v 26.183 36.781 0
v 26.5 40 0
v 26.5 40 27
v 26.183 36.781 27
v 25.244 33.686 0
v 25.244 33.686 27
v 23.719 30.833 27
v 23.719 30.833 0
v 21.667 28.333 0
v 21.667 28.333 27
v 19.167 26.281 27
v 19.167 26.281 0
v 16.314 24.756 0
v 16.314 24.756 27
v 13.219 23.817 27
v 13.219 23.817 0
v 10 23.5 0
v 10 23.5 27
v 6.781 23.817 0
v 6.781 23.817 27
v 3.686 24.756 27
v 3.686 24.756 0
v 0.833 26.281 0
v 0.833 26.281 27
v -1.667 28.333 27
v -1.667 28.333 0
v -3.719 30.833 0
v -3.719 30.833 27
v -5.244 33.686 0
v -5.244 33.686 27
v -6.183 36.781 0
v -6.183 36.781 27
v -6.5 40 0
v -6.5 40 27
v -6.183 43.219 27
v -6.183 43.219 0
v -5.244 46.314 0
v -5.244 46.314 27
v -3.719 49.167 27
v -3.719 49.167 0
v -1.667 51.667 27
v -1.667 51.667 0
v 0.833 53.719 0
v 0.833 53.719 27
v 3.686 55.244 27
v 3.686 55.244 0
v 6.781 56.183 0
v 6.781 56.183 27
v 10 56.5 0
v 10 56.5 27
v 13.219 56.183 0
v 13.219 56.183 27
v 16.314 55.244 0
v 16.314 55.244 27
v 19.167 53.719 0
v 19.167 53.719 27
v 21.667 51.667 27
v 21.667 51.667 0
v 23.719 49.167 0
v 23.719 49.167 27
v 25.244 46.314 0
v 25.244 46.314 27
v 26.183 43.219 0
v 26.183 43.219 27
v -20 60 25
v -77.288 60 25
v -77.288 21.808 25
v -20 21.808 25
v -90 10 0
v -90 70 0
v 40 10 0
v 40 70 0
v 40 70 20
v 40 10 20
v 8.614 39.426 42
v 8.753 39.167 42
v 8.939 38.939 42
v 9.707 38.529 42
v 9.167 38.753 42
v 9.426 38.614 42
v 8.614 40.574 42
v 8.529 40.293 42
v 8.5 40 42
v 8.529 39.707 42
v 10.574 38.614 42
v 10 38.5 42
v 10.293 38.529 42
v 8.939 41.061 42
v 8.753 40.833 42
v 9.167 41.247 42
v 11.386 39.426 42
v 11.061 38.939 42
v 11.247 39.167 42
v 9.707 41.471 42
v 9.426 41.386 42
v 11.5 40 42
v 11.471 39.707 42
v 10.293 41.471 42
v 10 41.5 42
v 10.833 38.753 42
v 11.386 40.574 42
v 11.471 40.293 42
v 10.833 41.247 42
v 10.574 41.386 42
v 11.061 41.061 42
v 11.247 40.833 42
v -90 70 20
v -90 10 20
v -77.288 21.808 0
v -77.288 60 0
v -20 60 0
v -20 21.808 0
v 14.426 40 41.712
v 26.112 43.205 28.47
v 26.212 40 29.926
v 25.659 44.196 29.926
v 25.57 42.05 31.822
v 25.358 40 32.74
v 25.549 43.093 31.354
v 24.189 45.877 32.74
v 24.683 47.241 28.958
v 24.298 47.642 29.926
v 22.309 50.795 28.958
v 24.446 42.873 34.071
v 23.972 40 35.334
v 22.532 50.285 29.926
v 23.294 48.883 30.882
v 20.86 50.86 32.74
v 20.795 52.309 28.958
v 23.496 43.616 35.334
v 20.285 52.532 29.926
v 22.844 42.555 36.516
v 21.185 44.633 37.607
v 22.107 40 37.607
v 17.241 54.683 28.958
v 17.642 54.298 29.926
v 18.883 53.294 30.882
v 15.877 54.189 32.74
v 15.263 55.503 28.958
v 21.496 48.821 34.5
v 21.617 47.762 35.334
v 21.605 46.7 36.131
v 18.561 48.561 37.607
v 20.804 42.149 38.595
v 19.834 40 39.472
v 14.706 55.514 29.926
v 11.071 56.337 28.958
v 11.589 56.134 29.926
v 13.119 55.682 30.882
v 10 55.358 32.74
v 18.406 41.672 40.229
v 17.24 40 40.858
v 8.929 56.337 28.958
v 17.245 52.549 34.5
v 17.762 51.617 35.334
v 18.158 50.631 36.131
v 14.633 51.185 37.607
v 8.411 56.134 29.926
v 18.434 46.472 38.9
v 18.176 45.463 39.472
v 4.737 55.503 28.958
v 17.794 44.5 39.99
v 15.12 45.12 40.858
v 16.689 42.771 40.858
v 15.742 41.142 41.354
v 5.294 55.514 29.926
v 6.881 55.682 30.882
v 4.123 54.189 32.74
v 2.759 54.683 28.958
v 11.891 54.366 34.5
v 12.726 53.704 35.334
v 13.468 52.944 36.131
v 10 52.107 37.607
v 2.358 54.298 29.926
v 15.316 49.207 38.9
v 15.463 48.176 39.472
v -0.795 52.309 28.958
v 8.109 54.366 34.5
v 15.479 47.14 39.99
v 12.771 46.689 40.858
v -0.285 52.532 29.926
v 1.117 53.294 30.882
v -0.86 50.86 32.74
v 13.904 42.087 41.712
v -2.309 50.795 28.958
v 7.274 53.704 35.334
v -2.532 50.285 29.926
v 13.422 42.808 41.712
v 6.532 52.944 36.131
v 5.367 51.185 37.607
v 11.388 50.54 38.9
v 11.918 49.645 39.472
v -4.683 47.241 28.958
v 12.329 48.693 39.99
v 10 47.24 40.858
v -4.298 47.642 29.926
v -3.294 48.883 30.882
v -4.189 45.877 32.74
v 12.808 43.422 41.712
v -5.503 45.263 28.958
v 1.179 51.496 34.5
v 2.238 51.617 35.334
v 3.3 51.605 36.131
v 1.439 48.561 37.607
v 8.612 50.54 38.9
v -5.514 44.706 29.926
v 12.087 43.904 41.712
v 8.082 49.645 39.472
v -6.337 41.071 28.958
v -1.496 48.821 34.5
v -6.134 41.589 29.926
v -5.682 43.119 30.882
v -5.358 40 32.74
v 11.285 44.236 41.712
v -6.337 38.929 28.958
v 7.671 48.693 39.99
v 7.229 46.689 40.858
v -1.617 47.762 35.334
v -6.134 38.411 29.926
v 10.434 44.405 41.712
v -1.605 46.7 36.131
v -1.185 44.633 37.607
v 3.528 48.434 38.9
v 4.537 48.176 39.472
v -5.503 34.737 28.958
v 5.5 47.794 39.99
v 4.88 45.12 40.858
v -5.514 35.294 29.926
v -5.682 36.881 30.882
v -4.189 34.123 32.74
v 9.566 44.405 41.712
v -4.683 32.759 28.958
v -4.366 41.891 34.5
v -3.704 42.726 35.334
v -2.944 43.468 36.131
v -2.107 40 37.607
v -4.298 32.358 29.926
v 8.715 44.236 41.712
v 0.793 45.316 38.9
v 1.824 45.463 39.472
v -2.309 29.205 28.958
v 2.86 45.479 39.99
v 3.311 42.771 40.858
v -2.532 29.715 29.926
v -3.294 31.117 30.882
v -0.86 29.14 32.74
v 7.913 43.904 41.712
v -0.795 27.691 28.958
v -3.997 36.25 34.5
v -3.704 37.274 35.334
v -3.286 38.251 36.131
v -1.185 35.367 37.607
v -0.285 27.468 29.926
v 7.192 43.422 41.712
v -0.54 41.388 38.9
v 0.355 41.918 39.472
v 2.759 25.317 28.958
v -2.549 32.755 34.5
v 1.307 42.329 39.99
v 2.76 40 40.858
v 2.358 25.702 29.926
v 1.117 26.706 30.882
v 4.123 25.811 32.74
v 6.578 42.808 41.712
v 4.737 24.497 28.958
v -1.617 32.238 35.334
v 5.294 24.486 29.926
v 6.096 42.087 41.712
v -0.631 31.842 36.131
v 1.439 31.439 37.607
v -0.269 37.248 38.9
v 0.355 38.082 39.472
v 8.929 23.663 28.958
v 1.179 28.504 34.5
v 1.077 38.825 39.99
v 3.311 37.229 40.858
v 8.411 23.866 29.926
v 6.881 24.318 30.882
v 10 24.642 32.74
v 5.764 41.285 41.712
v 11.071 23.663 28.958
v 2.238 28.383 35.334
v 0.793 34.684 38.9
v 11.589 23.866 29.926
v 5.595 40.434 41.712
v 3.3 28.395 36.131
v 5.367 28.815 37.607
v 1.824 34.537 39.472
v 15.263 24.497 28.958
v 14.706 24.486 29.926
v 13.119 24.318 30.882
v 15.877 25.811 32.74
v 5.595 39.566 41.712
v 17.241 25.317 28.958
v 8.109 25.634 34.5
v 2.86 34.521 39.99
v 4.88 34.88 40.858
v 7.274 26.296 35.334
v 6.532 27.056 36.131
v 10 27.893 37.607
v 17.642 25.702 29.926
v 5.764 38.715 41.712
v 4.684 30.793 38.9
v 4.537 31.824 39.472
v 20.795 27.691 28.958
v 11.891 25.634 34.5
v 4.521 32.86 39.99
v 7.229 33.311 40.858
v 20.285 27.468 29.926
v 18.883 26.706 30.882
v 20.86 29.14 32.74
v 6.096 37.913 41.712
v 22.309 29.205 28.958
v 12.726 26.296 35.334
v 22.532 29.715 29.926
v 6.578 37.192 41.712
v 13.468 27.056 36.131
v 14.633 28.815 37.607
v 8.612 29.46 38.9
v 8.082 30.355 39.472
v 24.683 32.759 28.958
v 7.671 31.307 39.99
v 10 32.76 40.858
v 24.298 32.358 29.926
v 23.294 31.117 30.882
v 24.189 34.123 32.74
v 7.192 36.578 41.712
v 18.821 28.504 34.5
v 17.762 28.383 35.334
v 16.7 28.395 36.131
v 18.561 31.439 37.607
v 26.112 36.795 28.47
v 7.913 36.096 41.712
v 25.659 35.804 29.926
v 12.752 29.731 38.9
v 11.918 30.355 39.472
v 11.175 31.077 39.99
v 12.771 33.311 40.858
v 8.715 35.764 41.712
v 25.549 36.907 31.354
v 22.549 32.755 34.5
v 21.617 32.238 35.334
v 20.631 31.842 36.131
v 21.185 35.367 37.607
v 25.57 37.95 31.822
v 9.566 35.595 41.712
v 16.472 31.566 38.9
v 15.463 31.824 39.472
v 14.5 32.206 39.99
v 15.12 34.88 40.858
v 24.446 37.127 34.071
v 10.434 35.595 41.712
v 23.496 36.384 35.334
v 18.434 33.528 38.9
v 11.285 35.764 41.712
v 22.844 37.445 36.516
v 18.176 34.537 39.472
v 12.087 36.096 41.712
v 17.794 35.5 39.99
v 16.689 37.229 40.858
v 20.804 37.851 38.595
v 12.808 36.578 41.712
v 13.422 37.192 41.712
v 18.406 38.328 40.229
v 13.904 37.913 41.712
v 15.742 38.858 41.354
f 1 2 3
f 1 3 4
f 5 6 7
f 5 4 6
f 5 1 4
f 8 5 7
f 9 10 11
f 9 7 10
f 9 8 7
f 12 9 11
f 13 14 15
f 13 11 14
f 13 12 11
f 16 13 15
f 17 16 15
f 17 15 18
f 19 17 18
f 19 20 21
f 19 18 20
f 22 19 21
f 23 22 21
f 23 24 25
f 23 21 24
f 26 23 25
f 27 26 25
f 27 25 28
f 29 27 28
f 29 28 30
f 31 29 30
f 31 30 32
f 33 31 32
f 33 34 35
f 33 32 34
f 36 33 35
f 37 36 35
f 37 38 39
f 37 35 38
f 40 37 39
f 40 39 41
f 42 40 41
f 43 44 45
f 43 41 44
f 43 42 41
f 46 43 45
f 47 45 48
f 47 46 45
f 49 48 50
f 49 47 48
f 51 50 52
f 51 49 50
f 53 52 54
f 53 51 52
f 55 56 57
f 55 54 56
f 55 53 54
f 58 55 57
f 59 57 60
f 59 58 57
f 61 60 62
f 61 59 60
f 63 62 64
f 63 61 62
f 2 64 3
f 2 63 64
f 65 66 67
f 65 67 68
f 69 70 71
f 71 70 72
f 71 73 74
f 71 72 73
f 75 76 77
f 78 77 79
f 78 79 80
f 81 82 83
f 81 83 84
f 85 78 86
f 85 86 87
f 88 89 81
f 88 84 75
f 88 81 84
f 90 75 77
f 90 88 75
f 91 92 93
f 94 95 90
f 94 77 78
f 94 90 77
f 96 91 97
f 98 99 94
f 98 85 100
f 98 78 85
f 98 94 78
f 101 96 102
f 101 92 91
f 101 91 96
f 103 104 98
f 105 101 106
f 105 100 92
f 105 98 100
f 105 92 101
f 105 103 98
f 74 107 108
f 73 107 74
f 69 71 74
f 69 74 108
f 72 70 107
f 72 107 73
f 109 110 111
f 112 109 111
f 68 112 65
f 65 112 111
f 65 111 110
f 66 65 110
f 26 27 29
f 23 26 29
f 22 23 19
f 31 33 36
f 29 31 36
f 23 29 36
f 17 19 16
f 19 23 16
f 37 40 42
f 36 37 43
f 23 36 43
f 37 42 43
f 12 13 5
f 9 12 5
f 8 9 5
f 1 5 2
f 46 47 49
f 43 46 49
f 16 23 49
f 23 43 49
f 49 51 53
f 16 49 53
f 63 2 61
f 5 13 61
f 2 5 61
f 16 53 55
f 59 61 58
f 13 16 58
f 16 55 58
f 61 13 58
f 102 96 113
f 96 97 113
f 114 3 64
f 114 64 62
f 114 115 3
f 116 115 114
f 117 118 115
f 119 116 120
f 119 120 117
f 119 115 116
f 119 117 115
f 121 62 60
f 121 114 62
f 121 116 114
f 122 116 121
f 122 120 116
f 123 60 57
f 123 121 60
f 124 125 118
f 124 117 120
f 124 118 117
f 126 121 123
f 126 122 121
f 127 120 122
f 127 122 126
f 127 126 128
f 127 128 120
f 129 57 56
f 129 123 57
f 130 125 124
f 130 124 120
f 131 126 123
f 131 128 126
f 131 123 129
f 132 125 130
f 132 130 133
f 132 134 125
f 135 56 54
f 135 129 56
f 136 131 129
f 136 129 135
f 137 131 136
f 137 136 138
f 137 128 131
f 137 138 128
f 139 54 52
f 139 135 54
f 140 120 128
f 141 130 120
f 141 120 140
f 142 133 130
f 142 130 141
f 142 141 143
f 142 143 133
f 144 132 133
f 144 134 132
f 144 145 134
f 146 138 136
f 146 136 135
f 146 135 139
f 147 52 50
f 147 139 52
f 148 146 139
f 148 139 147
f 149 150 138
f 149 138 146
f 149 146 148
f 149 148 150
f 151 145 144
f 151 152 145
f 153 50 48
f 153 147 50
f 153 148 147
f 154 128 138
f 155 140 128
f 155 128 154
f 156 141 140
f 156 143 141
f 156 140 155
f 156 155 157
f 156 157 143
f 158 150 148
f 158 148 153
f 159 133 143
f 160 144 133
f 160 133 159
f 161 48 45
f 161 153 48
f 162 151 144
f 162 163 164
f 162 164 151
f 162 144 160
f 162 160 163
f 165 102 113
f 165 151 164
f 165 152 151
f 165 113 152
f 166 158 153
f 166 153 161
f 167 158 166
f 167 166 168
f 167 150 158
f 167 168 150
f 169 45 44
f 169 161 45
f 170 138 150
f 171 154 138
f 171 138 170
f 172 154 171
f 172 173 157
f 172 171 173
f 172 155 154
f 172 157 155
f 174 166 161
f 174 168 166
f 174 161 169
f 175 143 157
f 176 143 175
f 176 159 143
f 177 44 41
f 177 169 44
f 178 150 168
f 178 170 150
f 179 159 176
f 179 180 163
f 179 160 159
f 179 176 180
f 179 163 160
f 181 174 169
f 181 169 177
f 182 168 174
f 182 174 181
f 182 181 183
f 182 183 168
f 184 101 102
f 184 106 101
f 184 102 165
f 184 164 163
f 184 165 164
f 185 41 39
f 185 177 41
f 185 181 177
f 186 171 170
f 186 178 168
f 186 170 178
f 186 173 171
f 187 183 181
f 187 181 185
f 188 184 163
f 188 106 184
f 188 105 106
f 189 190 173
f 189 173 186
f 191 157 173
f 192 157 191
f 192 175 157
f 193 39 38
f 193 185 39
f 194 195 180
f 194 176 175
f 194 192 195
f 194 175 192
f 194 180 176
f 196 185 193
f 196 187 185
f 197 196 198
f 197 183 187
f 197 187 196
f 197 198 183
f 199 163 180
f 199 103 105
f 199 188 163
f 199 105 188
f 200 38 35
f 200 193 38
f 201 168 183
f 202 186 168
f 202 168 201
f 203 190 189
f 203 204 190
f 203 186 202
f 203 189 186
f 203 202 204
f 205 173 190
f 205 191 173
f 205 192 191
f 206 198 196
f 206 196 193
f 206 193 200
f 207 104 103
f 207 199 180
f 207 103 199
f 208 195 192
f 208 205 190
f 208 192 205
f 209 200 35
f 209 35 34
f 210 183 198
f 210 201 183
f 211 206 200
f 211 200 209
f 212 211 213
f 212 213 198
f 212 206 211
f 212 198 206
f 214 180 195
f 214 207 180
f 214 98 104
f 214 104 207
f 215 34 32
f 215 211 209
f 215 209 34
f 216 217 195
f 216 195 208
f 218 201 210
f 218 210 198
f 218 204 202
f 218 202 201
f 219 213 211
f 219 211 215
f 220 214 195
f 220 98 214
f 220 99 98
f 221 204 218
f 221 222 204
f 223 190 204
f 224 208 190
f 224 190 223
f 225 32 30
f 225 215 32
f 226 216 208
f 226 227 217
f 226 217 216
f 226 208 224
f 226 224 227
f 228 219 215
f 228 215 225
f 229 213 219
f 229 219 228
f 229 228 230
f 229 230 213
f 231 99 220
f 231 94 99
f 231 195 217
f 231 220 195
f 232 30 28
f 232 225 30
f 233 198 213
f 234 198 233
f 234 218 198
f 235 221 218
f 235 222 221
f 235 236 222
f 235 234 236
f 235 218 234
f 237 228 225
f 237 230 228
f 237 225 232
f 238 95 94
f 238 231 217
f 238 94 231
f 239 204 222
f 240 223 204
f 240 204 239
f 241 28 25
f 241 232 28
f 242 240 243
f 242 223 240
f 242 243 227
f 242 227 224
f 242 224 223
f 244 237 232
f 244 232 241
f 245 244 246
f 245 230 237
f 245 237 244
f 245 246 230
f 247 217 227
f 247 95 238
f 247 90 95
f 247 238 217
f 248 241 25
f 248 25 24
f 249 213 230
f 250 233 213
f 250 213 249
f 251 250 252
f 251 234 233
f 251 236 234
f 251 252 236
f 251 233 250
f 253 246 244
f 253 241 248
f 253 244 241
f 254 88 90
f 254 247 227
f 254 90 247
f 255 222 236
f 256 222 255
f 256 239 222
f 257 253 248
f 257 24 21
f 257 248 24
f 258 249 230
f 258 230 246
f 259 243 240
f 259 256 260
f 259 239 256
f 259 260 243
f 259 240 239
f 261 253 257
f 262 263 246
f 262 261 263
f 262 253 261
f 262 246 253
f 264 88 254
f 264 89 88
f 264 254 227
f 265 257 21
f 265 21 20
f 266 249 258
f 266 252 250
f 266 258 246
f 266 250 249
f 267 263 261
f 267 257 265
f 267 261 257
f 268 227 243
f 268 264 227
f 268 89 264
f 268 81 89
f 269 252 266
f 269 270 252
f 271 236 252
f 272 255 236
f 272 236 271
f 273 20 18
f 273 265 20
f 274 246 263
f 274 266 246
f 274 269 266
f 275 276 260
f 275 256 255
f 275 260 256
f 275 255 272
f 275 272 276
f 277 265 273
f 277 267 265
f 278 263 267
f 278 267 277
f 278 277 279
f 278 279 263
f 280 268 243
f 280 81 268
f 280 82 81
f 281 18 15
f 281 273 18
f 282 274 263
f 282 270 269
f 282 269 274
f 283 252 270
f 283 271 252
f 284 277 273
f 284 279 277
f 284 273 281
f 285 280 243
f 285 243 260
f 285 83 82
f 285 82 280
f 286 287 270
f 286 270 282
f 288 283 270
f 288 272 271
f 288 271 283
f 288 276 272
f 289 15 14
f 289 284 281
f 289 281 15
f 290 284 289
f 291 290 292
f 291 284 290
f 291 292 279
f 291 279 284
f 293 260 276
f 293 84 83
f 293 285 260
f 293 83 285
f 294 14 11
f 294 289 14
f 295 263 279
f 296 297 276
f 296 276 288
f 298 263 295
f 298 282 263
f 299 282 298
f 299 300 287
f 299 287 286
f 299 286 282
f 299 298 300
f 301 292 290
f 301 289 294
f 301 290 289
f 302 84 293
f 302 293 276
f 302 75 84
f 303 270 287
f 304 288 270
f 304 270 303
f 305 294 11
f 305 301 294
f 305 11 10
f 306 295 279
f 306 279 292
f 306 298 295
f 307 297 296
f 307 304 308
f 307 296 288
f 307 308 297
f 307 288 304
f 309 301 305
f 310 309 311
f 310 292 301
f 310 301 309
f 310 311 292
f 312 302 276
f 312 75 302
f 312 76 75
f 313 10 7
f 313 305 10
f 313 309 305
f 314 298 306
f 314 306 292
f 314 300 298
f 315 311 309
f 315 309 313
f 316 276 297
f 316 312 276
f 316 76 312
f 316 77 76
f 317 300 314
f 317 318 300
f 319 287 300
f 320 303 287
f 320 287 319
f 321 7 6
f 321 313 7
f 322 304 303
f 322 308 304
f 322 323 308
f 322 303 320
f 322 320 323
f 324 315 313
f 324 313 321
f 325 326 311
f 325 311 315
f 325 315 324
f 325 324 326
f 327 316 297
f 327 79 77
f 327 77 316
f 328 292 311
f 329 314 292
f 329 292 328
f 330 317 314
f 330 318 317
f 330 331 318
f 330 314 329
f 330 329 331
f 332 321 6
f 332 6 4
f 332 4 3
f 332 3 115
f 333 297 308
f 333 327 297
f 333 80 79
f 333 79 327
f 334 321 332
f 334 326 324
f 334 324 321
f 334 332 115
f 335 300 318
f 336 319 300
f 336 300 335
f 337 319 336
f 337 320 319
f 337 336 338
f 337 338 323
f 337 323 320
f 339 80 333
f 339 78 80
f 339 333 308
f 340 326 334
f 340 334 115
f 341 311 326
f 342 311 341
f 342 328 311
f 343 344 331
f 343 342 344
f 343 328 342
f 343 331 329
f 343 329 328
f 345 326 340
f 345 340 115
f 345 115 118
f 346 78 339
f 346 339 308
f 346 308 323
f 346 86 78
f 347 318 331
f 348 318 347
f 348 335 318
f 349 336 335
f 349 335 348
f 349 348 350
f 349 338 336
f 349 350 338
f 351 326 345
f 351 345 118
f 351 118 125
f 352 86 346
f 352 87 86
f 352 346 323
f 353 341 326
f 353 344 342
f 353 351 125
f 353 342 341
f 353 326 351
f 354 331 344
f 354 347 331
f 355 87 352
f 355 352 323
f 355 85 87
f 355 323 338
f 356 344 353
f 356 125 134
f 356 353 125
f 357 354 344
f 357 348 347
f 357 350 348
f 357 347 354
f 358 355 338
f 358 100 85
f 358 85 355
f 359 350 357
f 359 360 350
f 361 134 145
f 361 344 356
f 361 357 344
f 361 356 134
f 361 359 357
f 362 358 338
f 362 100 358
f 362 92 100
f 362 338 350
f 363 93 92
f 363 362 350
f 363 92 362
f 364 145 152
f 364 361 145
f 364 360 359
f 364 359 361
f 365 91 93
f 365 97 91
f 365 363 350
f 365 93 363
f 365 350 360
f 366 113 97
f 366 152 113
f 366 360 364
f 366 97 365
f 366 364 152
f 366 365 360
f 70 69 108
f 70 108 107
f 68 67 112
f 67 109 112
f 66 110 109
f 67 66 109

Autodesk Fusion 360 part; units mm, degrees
sketch "Esquisse1" plane through (0, 0, 0) normal (0, 0, 1) x (1, 0, 0)
  line L0 (-20, 60) -> (-77.288, 60)
  line L1 (-77.288, 60) -> (-77.288, 21.808)
  line L2 (-77.288, 21.808) -> (-20, 21.808)
  line L3 (-20, 21.808) -> (-20, 60)
  dimension "d1" = 57.288
  dimension "d2" = 38.192
sketch "Esquisse2" plane through (0, 0, 0) normal (0, 0, 1) x (1, 0, 0)
  circle A0 centre (10, 40) radius 16.5
  dimension "d3" = 33
sketch "Esquisse3" plane through (0, 0, 0) normal (0, 0, 1) x (1, 0, 0)
  line L0 (-90, 70) -> (40, 70)
  line L1 (40, 70) -> (40, 10)
  line L2 (40, 10) -> (-90, 10)
  line L3 (-90, 10) -> (-90, 70)
extrude "Extrusion1" add sketch "Esquisse2" along normal blind 42 makes body 1
extrude "Extrusion2" add sketch "Esquisse1" along normal blind 25 separate body makes body 2
extrude "Extrusion3" add sketch "Esquisse3" along normal blind 20 separate body makes body 3
fillet "Congé1" radius 15 1 edges at (-5.3834, 34.0333, 42) on bodies 1
